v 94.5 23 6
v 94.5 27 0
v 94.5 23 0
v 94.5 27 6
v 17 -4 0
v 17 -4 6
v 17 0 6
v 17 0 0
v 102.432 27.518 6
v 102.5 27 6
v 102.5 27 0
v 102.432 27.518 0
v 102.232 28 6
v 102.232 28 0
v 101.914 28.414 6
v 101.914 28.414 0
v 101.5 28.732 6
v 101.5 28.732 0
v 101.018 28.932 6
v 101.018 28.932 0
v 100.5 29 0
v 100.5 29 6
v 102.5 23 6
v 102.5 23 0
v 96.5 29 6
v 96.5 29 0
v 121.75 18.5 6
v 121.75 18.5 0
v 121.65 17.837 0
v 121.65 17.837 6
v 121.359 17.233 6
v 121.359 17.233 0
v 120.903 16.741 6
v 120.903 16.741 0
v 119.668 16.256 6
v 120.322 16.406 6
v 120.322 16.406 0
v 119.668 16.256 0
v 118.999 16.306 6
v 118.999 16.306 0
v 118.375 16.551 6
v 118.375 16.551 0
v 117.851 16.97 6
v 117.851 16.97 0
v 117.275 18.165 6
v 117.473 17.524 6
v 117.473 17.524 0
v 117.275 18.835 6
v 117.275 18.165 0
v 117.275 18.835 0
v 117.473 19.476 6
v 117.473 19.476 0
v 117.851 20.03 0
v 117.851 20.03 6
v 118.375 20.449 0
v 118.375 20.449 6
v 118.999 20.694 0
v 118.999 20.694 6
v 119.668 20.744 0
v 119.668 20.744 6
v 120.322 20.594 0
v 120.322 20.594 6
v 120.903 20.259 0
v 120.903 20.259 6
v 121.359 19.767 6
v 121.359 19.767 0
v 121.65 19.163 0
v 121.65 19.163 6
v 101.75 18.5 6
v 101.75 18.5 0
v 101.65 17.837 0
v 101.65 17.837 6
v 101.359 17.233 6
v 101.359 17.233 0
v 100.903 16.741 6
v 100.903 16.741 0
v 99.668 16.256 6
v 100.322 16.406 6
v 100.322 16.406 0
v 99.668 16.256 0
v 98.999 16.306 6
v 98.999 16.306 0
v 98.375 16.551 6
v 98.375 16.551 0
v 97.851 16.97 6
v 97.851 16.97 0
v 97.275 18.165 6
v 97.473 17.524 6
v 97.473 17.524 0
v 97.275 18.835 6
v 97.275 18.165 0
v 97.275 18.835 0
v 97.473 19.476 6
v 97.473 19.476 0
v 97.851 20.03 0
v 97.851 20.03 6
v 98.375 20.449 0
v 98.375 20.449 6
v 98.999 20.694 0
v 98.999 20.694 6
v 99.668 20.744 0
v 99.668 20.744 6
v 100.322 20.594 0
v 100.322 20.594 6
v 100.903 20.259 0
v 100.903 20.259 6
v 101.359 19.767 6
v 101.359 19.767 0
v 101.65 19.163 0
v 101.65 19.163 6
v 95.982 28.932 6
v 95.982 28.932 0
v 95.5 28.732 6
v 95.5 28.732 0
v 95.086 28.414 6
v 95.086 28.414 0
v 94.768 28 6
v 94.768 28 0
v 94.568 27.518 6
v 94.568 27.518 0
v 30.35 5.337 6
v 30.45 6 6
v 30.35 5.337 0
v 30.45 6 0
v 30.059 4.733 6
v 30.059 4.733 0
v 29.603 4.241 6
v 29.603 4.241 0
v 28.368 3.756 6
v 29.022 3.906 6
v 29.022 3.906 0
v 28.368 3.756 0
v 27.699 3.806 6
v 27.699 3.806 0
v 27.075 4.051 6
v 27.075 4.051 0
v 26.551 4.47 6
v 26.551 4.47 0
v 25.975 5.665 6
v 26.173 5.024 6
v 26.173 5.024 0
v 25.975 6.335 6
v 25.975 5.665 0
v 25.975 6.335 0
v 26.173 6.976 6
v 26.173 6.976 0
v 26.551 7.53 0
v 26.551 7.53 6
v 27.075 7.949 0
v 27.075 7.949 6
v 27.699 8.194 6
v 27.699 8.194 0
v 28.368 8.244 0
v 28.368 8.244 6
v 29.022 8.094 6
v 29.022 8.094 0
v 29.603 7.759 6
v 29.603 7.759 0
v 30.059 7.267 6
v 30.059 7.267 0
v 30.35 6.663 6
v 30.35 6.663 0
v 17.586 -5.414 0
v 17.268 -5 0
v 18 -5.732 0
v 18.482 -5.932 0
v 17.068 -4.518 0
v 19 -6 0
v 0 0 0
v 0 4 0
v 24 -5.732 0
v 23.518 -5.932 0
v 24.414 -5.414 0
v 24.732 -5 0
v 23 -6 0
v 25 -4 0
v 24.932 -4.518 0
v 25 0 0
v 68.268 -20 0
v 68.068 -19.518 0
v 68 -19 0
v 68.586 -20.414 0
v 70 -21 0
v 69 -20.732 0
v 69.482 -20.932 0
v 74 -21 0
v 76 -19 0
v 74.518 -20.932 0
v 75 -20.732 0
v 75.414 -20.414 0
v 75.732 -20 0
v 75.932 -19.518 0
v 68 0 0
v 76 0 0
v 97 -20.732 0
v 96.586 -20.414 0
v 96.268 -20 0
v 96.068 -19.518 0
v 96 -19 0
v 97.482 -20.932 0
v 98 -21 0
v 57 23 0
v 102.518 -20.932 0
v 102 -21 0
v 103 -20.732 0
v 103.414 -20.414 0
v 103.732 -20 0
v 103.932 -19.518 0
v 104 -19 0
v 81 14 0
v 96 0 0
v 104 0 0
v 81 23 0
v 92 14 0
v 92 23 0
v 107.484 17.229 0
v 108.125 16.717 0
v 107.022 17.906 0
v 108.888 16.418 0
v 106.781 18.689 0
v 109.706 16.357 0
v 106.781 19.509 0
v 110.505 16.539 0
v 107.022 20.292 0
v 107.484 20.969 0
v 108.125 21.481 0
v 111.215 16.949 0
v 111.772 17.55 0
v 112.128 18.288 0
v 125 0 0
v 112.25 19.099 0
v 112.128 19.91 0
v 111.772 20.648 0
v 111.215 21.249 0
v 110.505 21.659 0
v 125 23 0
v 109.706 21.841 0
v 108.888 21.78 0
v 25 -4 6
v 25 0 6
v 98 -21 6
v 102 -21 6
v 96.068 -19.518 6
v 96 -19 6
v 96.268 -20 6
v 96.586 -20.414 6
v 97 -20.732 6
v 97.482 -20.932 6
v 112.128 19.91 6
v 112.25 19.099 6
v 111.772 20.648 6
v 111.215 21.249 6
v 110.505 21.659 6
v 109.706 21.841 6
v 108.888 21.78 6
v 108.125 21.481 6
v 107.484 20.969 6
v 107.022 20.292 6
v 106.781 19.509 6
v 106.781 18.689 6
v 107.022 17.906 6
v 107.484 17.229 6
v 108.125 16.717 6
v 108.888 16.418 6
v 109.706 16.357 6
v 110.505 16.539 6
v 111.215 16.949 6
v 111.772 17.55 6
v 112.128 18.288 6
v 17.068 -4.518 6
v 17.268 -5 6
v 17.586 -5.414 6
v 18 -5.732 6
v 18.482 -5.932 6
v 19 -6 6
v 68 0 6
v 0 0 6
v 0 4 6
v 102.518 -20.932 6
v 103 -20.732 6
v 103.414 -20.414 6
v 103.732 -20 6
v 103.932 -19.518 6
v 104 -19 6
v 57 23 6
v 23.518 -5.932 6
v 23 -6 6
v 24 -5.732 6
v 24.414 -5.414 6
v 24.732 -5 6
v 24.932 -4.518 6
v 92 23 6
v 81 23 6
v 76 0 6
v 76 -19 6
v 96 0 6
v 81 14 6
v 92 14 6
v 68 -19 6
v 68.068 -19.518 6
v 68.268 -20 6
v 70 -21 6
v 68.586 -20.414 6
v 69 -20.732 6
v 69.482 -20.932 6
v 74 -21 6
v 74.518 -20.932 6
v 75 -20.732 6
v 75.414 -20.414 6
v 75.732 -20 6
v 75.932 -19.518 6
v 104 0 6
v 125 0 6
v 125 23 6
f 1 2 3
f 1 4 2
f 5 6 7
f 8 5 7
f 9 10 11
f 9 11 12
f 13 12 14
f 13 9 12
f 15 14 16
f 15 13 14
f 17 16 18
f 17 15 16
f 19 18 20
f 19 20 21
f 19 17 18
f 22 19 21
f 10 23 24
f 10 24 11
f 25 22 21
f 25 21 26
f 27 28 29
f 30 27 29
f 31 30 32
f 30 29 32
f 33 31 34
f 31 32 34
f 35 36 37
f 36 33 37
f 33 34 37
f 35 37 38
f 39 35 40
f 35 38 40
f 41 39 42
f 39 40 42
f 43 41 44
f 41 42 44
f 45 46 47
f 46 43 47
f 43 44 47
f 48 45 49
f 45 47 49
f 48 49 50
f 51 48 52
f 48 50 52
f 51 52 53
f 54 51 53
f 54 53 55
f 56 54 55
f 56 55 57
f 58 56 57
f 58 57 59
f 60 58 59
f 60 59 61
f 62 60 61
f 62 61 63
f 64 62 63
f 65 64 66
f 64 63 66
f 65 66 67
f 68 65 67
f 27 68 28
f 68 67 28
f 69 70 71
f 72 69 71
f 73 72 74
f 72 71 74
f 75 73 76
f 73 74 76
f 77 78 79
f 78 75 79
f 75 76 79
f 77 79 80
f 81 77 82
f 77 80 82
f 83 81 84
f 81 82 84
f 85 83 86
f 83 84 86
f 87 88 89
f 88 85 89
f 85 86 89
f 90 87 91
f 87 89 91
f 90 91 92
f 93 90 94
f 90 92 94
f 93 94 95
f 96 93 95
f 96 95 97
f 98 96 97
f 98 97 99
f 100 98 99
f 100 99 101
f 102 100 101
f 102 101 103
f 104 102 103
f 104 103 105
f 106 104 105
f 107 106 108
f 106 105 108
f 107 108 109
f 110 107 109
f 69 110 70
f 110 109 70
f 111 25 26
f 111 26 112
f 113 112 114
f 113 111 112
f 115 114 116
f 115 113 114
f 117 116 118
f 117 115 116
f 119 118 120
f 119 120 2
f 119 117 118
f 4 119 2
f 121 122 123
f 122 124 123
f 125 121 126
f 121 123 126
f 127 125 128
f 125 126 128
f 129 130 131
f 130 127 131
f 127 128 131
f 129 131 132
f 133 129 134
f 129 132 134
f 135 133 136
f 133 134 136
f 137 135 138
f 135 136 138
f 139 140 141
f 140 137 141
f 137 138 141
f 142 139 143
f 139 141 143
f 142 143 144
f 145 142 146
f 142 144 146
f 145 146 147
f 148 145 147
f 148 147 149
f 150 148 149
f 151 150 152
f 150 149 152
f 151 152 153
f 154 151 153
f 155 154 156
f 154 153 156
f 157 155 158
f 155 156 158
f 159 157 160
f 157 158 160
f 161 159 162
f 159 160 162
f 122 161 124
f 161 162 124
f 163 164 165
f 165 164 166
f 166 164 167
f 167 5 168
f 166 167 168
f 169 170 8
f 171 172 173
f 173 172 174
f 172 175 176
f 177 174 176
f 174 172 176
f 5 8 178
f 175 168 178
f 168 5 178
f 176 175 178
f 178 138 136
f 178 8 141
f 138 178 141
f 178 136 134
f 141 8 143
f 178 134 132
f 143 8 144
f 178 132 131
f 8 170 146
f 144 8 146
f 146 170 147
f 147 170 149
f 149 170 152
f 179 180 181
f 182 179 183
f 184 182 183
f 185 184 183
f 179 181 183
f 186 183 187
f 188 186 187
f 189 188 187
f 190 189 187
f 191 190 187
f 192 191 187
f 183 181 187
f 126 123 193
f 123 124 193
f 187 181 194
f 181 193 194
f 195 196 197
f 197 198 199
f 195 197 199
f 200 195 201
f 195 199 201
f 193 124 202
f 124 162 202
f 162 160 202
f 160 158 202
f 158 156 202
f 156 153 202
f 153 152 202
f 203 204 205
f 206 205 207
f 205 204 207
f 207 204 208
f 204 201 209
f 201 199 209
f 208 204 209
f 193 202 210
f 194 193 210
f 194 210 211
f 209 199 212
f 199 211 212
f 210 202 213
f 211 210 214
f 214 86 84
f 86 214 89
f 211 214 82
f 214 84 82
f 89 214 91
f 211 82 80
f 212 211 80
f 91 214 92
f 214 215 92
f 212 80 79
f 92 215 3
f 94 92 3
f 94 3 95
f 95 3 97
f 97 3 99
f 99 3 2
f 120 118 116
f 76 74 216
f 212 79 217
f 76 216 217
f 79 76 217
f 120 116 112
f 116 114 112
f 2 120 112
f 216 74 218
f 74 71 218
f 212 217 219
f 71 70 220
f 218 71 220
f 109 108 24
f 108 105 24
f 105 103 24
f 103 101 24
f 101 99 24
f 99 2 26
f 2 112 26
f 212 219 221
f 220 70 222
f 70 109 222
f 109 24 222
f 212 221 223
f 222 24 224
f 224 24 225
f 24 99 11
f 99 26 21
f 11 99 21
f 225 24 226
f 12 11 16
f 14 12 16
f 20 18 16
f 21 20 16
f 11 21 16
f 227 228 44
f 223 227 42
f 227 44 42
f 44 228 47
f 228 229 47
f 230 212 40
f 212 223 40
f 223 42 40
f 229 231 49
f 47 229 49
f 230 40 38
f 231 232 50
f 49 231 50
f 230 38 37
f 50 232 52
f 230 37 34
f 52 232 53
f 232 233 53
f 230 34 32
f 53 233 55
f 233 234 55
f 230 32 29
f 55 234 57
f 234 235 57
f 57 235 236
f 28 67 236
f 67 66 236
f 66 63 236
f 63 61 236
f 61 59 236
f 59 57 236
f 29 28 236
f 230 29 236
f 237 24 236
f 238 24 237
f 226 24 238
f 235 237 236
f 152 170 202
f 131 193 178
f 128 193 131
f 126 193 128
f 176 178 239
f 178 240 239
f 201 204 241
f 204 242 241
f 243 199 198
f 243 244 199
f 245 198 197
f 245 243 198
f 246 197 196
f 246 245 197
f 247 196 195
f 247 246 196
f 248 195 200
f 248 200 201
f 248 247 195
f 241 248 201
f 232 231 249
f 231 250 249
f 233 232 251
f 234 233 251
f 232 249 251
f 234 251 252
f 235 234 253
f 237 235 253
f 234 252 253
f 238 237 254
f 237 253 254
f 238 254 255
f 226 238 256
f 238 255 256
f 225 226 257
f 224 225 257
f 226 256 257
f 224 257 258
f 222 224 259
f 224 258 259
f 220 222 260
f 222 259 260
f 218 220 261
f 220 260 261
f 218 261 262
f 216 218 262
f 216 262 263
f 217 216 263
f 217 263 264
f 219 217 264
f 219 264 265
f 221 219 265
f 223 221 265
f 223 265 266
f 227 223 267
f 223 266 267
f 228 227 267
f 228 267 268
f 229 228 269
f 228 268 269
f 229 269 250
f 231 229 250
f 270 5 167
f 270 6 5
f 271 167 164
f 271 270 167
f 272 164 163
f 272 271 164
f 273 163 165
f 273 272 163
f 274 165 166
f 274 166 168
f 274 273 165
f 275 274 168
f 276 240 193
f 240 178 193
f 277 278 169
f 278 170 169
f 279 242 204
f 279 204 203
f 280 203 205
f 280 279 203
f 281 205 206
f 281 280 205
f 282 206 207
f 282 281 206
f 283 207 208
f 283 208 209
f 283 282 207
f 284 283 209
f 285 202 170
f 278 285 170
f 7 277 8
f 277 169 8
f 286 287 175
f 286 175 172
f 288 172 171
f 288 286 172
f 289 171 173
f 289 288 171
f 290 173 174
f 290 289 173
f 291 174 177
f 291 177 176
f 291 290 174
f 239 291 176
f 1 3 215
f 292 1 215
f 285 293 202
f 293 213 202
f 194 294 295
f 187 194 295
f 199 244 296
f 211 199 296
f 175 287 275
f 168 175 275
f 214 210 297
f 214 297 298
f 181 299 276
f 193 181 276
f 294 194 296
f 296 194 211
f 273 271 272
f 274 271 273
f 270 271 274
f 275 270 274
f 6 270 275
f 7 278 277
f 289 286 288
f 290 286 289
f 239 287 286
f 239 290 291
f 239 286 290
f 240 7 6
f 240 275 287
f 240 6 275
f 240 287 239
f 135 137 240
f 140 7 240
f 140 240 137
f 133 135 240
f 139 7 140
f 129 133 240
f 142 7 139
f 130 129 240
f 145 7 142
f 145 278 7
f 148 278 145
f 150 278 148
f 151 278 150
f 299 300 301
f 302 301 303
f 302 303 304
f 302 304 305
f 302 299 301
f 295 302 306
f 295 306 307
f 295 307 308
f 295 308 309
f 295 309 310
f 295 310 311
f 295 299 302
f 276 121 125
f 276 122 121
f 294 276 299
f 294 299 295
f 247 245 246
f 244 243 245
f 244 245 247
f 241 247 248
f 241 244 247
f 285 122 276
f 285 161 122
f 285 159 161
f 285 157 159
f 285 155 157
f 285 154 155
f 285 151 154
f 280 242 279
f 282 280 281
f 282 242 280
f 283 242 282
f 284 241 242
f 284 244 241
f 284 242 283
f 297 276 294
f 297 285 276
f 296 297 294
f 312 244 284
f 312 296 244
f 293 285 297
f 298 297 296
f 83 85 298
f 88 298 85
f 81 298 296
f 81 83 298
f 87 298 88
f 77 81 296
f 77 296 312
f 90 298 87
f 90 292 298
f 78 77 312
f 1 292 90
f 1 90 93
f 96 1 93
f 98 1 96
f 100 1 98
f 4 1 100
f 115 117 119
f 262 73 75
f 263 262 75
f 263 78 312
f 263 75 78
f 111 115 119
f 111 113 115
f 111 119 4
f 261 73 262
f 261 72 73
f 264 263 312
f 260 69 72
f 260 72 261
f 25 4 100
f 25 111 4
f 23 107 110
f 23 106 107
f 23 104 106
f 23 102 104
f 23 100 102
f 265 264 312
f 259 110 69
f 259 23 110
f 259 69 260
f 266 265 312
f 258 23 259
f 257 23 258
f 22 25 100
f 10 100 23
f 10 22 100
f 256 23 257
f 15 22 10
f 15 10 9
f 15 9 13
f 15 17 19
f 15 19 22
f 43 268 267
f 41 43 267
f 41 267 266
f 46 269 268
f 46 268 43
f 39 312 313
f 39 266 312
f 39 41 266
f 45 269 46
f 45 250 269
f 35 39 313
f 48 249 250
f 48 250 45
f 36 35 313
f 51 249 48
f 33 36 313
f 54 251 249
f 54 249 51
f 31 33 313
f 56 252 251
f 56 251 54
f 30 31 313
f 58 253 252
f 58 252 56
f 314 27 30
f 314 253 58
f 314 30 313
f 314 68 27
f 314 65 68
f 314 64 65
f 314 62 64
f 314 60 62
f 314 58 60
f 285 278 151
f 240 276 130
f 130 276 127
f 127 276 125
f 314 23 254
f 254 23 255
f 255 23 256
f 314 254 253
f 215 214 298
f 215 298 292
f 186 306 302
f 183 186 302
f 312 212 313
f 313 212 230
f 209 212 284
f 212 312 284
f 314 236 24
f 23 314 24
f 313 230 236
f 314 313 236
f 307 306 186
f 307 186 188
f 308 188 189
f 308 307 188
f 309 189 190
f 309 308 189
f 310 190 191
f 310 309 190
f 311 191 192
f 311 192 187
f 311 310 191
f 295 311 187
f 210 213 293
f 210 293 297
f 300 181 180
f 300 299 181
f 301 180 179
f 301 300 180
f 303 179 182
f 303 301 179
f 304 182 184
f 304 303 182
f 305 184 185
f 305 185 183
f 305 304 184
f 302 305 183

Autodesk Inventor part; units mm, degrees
ref_plane "YZ Plane" through (0, 0, 0) normal (1, 0, 0) x (0, 1, 0)
ref_plane "XZ Plane" through (0, 0, 0) normal (0, 1, 0) x (-1, 0, 0)
ref_plane "XY Plane" through (0, 0, 0) normal (0, 0, 1) x (1, 0, 0)
sketch "Sketch1" plane through (0, 0, 0) normal (0, 0, 1) x (1, 0, 0)
  line L0 (0, 4) -> (0, 0)
  line L1 (0, 0) -> (125, 0)
  line L2 (125, 0) -> (125, 23)
  line L3 (57, 23) -> (0, 4)
  line L4 (81, 23) -> (81, 14)
  line L5 (81, 14) -> (92, 14)
  line L6 (92, 14) -> (92, 23)
  line L7 (125, 23) -> (92, 23)
  line L8 (81, 23) -> (57, 23)
  circle A0 centre (99.5, 18.5) radius 2.25
  circle A1 centre (119.5, 18.5) radius 2.25
  circle A2 centre (28.2, 6) radius 2.25
  circle A3 centre (28.2, 6) radius 4.5 construction
  point P0 (92, 18.5)
  dimension "d0" = 4
  dimension "d1" = 125
  dimension "d2" = 9
  dimension "d3" = 11
  dimension "d4" = 33
  dimension "d5" = 24
  dimension "d6" = 23
  dimension "d7" = 4.5
  dimension "d8" = 4.5
  dimension "d9" = 5.5
  dimension "d10" = 20
  dimension "d11" = 4.5
  dimension "d12" = 9
  dimension "d13" = 6
  dimension "d14" = 28.2
extrude "Extrusion1" add sketch "Sketch1" along normal blind 6
sketch "Sketch2" plane through (0, 0, 6) normal (0, 0, 1) x (1, 0, 0)
  line L0 (0, 0) -> (125, 0) projected
  line L1 (125, 0) -> (125, 23) projected
  line L2 (125, 23) -> (92, 23) projected
  line L3 (17, 0) -> (25, 0)
  line L4 (25, 0) -> (25, -4)
  line L5 (23, -6) -> (19, -6)
  line L6 (17, -4) -> (17, 0)
  line L7 (96, 0) -> (104, 0)
  line L8 (104, 0) -> (104, -19)
  line L9 (102, -21) -> (98, -21)
  line L10 (96, -19) -> (96, 0)
  line L11 (68, 0) -> (76, 0)
  line L12 (76, 0) -> (76, -19)
  line L13 (74, -21) -> (70, -21)
  line L14 (68, -19) -> (68, 0)
  line L15 (94.5, 23) -> (102.5, 23)
  line L16 (102.5, 23) -> (102.5, 27)
  line L17 (100.5, 29) -> (96.5, 29)
  line L18 (94.5, 27) -> (94.5, 23)
  arc A0 (17, -4) -> (19, -6) centre (19, -4) ccw
  arc A1 (23, -6) -> (25, -4) centre (23, -4) ccw
  arc A2 (96, -19) -> (98, -21) centre (98, -19) ccw
  arc A3 (102, -21) -> (104, -19) centre (102, -19) ccw
  arc A4 (68, -19) -> (70, -21) centre (70, -19) ccw
  arc A5 (74, -21) -> (76, -19) centre (74, -19) ccw
  arc A6 (96.5, 29) -> (94.5, 27) centre (96.5, 27) ccw
  arc A7 (102.5, 27) -> (100.5, 29) centre (100.5, 27) ccw
  dimension "d17" = 2
  dimension "d18" = 17
  dimension "d20" = 8
  dimension "d21" = 8
  dimension "d22" = 8
  dimension "d24" = 6
  dimension "d25" = 43
  dimension "d26" = 20
  dimension "d29" = 8
  dimension "d32" = 22.5
  dimension "d40" = 6
  dimension "d41" = 2
  dimension "d42" = 2
  dimension "d45" = 21
sketch "Sketch3" plane through (0, 0, 6) normal (0, 0, 1) x (1, 0, 0)
  circle A0 centre (119.5, 18.5) radius 2.25 projected
  circle A1 centre (109.5, 19.099) radius 2.75
  circle A2 centre (86.5, 19.099) radius 7.5 construction
  dimension "d35" = 5.5
  dimension "d36" = 15
  dimension "d37" = 10
extrude "Extrusion3" cut sketch "Sketch3" against normal blind 6 contours A1
extrude "Extrusion4" add sketch "Sketch2" against normal blind 6
properties part number "x_motor_upper_nut_stop"
